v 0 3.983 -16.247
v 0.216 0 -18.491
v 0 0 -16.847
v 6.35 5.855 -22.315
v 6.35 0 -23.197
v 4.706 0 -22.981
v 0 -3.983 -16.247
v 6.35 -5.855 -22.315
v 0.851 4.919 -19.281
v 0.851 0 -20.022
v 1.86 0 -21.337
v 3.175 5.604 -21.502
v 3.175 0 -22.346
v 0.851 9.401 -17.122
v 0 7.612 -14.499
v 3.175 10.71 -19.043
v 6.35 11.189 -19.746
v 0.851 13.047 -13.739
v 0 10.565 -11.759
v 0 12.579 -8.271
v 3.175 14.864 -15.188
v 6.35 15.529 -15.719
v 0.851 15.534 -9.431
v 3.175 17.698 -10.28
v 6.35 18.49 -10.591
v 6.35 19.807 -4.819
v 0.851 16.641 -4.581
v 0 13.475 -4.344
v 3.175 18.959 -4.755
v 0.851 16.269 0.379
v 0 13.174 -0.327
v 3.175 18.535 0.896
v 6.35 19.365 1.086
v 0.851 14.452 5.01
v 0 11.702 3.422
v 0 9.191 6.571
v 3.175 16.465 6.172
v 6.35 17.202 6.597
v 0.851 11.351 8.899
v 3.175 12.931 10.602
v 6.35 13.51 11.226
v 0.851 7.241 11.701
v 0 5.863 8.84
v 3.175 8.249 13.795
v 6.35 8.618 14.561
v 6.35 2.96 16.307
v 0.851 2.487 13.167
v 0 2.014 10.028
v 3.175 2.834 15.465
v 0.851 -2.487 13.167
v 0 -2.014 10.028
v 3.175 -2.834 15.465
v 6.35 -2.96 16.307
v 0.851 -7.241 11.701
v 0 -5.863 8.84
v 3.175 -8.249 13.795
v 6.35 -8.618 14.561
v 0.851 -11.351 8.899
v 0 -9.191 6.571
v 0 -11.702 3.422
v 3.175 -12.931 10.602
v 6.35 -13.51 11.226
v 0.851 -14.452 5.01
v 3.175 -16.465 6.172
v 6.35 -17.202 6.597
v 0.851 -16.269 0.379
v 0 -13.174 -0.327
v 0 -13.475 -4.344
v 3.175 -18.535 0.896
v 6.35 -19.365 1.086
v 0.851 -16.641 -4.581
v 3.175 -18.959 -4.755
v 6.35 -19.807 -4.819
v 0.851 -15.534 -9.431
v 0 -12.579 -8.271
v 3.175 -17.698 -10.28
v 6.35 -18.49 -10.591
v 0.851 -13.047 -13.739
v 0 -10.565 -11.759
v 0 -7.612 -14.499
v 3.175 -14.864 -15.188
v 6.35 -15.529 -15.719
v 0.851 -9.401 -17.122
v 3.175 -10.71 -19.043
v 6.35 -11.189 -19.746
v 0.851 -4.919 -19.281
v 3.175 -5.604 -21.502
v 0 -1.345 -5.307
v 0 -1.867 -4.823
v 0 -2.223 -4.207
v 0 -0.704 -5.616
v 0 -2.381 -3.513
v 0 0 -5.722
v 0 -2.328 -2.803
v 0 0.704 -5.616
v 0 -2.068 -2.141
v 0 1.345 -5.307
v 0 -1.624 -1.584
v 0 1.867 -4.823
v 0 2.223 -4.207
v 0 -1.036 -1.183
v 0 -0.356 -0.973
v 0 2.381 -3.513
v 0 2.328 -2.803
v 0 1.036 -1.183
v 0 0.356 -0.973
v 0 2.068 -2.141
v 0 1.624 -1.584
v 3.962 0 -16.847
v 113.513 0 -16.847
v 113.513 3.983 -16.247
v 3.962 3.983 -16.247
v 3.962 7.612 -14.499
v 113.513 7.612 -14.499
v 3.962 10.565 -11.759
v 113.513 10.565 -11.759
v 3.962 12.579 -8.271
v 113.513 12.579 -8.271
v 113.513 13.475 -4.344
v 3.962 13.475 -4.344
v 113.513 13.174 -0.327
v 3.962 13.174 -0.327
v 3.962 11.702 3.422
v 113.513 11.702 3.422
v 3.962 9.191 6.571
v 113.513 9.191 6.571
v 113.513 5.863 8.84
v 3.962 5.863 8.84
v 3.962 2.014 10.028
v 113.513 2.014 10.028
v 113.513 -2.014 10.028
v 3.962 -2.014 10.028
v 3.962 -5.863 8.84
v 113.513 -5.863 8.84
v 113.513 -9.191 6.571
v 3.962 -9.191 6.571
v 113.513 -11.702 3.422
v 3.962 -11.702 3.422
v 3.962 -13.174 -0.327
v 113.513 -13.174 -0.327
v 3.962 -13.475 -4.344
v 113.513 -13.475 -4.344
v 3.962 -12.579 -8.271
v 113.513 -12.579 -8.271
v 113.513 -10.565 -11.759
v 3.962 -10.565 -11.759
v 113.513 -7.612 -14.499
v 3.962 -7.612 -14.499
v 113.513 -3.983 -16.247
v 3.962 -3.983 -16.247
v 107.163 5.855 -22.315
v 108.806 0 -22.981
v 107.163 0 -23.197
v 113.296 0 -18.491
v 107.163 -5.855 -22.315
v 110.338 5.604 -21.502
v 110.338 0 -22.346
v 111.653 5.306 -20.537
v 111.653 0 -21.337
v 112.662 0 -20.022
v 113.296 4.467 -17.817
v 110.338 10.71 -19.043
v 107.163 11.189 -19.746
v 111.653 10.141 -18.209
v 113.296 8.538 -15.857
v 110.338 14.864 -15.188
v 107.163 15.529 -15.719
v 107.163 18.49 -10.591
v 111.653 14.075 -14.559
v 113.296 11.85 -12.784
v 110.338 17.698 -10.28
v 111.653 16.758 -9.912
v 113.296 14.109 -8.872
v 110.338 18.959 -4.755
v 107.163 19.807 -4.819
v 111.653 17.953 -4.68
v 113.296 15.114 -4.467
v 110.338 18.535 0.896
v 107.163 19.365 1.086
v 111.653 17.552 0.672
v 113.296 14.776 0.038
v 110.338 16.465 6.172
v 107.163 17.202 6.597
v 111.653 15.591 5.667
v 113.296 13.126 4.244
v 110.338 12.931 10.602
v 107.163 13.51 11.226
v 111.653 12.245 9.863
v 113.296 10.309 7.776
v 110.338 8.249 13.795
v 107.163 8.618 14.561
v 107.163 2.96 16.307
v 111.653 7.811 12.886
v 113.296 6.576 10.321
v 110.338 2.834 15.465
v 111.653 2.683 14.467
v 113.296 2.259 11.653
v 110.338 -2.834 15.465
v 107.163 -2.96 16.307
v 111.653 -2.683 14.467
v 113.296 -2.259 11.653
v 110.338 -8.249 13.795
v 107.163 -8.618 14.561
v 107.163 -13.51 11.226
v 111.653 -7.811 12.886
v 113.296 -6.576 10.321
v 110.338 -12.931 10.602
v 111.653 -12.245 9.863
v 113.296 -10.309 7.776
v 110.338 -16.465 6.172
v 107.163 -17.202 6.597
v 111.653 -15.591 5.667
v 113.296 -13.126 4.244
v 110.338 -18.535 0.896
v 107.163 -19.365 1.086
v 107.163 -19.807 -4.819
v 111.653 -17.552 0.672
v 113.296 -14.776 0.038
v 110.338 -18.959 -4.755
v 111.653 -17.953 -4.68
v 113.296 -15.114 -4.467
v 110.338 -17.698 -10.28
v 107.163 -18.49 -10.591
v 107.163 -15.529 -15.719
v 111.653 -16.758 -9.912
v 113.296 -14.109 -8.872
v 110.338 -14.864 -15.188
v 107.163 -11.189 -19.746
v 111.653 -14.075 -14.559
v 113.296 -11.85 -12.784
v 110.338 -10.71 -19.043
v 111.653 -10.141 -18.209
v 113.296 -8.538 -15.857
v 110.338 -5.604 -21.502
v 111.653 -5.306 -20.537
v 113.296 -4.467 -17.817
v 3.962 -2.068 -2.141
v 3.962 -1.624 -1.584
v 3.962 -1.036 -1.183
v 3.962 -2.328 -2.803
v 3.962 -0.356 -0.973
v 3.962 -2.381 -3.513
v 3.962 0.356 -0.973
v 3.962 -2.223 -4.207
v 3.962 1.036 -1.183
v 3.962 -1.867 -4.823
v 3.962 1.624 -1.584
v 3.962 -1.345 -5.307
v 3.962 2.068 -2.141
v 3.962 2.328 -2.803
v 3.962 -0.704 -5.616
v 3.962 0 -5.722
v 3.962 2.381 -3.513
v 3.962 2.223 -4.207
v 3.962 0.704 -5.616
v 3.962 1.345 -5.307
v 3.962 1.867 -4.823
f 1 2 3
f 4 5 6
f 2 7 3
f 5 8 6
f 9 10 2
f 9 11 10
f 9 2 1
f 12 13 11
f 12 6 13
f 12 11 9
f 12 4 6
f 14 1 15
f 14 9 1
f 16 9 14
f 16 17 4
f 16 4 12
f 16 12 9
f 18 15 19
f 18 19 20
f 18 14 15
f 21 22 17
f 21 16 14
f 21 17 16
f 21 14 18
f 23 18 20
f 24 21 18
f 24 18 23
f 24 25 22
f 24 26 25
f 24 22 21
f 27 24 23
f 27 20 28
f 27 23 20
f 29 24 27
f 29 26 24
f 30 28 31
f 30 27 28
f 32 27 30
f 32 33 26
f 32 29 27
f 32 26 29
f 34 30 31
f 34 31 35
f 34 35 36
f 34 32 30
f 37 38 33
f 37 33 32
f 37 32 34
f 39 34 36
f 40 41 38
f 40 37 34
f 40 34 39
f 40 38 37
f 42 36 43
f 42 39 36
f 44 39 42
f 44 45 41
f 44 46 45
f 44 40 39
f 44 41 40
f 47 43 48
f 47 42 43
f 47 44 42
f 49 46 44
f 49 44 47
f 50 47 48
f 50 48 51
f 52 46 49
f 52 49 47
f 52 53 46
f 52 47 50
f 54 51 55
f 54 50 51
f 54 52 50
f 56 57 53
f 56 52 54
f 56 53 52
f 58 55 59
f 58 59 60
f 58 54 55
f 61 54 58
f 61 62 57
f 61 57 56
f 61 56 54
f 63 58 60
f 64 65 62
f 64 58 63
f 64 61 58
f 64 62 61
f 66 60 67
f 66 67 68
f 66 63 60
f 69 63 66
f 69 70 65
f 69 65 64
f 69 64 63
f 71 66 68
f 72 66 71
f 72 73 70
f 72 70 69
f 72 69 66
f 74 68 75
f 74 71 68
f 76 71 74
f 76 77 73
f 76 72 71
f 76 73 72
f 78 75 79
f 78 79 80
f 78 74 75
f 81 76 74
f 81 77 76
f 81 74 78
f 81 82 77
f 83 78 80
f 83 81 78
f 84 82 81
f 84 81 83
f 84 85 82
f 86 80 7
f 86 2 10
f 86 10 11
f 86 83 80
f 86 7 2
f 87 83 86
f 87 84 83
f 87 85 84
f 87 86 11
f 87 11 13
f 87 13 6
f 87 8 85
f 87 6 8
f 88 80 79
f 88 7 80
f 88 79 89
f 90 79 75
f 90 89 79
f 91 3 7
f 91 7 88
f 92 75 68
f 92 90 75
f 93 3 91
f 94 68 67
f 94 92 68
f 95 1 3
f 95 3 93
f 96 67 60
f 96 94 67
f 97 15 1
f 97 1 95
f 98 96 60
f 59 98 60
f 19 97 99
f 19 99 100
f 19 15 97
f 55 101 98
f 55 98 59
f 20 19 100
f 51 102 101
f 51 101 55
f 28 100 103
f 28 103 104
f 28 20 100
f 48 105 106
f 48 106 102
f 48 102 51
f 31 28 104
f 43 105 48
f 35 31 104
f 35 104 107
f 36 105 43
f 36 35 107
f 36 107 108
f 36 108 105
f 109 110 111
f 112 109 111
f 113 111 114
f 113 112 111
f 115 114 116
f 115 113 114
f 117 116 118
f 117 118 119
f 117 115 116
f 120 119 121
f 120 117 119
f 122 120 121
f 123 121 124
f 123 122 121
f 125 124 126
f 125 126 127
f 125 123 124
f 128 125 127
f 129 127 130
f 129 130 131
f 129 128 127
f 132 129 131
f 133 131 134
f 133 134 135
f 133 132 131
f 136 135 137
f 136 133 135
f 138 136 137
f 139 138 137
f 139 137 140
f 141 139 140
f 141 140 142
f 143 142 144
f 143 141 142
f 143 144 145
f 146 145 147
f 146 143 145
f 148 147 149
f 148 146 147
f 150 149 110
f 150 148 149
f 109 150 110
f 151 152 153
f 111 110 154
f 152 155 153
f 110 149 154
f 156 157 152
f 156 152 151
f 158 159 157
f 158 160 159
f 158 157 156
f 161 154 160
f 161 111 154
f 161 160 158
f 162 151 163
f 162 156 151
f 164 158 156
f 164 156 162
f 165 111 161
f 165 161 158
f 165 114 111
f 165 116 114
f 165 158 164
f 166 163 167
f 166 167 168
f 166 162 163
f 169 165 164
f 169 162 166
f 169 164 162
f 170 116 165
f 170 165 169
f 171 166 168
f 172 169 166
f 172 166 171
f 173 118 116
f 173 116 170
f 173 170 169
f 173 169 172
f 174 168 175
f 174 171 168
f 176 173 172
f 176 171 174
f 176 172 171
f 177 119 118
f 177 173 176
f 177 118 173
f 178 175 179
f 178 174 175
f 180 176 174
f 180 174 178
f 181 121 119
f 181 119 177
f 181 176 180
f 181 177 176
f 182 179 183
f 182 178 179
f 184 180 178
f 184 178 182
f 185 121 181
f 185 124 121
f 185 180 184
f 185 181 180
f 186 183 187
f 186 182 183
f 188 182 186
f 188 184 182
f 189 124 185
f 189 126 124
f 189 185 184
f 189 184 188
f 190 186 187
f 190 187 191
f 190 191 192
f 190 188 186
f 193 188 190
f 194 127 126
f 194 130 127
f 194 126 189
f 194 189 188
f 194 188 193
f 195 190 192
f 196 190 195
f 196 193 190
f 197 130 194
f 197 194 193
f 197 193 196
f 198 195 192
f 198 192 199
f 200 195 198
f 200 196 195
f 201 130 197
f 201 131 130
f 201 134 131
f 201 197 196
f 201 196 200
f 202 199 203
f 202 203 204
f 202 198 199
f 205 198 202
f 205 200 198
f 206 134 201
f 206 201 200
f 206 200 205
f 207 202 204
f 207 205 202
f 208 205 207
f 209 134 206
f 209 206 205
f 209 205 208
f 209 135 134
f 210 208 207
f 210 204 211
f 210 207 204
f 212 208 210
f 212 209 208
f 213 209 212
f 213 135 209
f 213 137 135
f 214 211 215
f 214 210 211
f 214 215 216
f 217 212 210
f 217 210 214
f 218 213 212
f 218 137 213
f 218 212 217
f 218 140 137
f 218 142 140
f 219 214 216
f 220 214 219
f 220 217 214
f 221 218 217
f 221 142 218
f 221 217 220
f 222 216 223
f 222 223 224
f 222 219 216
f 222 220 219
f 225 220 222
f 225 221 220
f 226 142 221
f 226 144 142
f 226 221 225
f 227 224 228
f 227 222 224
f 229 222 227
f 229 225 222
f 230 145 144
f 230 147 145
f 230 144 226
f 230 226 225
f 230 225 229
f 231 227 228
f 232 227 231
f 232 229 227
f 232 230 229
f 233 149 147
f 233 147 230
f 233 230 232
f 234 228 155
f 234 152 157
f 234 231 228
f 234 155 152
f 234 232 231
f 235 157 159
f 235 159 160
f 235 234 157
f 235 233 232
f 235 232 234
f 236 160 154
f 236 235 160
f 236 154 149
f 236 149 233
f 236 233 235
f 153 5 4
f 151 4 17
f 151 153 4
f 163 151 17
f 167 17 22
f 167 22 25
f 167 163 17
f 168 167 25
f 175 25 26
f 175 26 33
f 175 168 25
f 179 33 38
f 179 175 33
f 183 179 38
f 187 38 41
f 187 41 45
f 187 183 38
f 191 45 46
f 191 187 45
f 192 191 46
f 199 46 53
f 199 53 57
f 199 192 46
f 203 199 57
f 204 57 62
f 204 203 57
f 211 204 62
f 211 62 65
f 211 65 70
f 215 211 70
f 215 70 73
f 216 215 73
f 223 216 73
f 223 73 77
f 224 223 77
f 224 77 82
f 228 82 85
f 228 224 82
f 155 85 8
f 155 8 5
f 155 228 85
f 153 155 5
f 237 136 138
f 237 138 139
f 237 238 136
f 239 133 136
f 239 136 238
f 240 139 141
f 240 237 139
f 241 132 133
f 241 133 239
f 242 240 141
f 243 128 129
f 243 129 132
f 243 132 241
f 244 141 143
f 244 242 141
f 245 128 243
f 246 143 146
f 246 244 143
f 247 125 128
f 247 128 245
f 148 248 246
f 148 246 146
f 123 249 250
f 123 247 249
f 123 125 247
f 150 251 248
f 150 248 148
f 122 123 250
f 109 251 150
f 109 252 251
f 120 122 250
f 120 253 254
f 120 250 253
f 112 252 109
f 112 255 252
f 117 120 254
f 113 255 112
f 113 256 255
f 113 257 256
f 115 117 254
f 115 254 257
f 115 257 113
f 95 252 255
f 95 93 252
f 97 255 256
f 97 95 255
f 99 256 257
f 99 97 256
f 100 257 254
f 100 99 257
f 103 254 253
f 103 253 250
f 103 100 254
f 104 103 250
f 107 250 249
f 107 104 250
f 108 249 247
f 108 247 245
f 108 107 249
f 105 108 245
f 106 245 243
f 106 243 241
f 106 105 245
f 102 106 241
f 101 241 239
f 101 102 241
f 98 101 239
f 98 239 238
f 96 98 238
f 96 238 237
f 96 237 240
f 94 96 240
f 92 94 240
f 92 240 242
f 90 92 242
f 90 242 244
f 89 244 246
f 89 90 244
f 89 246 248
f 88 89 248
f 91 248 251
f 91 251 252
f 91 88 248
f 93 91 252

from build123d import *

# Parameters (mm, degrees)
F2_R = 6.34999


# Not quite as in the source:
# - a fillet or chamfer is up to 0.001 mm smaller than in the source, because OpenCascade refuses the exact size


with BuildPart() as f1:
    # F0 (on Front) → F1 (revolve)
    with BuildSketch(Plane.XZ):
        Polygon((3.9624, -5.7219677535), (0, -5.7219677535), (0, -23.1971677535), (113.5126, -23.1971677535), (113.5126, -16.8471677535), (3.9624, -16.8471677535), align=None)
    revolve(axis=Axis((1.9812, 0, -3.3343677535), (1, 0, 0)))

    # F2 (radius 6.35 in the source; OpenCascade refuses exactly that, so slightly less here)
    f2_edges = [f1.edges().sort_by_distance(p)[0] for p in [
        (0, 0, 16.528432),
        (113.5126, 0, 16.528432),
    ]]
    fillet(f2_edges, radius=F2_R)


solid = f1.part
